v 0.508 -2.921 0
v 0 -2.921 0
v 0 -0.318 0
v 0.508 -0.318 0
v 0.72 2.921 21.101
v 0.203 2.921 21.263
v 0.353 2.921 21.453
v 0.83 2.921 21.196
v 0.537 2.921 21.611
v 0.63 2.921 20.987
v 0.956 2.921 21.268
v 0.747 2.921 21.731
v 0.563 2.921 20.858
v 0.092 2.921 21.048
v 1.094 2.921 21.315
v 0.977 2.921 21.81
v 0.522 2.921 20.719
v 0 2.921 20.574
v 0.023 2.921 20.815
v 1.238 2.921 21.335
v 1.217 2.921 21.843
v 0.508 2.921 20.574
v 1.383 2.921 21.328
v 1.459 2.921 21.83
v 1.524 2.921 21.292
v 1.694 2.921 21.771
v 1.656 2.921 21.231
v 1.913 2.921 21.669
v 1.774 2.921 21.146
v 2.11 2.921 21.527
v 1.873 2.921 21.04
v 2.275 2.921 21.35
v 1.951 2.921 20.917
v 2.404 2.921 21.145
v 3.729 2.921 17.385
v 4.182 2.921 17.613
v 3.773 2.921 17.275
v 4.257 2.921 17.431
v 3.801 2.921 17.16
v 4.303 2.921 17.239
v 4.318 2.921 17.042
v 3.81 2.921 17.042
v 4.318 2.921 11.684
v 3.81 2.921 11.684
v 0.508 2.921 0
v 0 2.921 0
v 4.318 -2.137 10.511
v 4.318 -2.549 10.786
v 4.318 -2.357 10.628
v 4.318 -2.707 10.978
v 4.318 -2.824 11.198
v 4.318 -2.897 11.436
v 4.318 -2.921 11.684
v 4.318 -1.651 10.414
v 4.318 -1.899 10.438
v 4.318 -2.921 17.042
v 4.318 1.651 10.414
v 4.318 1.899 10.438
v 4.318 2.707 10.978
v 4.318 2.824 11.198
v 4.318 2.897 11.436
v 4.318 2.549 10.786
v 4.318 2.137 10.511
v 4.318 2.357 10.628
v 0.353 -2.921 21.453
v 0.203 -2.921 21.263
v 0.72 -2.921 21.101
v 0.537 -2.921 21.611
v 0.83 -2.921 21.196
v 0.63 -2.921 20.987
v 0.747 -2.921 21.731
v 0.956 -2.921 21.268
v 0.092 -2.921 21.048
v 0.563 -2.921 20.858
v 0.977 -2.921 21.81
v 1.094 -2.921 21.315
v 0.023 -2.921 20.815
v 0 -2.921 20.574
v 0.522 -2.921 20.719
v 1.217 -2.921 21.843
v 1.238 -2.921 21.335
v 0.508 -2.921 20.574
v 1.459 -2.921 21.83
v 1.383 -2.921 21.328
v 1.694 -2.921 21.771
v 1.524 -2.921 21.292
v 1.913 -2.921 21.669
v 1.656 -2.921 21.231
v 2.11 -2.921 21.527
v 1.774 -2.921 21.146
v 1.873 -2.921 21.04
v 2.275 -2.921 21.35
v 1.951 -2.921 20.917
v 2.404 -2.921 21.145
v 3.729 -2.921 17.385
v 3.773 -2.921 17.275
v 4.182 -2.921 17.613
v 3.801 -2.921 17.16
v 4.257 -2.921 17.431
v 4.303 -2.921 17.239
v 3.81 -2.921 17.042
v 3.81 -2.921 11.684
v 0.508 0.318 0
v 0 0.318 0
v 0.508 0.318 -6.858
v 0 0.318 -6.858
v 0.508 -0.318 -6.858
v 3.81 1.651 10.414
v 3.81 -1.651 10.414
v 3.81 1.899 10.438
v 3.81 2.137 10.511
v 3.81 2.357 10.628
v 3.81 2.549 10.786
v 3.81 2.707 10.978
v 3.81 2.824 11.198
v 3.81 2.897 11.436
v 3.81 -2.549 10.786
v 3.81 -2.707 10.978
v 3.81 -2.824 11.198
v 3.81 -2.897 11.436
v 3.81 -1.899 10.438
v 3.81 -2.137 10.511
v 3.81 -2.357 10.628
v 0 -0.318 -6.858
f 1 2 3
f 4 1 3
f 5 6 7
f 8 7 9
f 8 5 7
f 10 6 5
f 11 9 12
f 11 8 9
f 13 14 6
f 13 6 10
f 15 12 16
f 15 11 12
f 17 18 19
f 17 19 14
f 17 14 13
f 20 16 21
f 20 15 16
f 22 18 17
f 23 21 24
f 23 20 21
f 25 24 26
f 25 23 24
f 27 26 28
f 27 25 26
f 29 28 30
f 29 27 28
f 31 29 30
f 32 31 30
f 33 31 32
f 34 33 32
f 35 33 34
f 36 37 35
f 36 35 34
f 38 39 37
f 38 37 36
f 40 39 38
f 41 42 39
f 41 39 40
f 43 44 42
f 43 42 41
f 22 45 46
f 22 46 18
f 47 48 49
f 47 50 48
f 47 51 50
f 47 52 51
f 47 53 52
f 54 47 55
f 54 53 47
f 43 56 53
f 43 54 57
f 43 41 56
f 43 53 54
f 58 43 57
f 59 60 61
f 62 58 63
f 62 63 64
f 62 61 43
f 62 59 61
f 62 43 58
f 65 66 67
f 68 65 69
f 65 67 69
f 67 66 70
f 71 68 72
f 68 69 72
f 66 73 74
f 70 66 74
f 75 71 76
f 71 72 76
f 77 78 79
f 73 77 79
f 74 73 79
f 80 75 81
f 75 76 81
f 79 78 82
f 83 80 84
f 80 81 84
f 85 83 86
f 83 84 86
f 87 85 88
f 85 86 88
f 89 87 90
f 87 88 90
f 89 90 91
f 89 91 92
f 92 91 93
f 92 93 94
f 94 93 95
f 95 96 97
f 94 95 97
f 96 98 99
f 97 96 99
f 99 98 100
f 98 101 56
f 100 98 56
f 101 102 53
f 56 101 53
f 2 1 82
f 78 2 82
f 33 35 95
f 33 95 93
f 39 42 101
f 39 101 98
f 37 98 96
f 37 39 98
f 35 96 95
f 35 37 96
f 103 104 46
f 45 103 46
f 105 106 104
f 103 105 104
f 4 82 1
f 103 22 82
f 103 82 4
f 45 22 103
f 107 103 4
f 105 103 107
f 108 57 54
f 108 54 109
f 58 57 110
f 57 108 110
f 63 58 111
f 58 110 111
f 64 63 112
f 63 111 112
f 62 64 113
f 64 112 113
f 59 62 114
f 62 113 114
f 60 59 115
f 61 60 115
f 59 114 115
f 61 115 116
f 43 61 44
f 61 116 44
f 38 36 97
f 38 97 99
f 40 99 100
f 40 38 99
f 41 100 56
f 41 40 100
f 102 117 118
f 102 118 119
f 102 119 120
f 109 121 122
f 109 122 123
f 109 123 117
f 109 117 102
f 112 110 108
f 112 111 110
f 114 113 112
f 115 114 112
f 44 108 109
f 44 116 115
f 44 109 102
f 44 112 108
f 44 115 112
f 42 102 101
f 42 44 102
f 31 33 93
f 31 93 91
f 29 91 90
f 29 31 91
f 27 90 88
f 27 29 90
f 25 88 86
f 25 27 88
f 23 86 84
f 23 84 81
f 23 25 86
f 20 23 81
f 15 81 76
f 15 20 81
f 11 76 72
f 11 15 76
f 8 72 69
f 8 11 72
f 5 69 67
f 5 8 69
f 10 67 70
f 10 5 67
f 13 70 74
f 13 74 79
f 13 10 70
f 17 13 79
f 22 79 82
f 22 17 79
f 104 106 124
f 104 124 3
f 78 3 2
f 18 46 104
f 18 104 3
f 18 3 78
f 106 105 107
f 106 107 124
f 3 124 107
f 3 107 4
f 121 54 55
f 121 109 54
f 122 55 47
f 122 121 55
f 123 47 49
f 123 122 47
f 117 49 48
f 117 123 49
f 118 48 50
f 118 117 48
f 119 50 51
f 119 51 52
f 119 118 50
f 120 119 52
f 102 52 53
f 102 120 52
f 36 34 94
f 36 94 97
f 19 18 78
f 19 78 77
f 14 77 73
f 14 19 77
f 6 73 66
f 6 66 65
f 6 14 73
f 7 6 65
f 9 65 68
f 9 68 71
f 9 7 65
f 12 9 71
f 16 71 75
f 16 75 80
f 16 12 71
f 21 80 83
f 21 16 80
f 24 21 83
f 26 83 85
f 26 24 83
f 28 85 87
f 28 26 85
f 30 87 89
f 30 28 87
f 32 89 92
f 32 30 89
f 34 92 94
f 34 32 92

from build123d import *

# Parameters (mm, degrees)
EXTRUDE_THIN1_DEPTH = 2.921
FILLET1_R           = 1.27
SKETCH2_W           = 6.858
SKETCH2_H           = 2.6035
CUT_EXTRUDE1_DEPTH  = 23.45746426


with BuildPart() as part:
    # Sketch1 → Extrude-Thin1 (new, symmetric)
    with BuildSketch(Plane(origin=(0, 0, 0), x_dir=(1, 0, 0), z_dir=(0, 1, 0))):
        with BuildLine():
            Line((0, 6.858), (0, 0))
            Line((0, 0), (0, -20.574))
            ThreePointArc((0, -20.574), (0.976529529, -21.809627404), (2.404370209, -21.145055365))
            Line((2.404370209, -21.145055365), (4.182370209, -17.613155736))
            ThreePointArc((4.182370209, -17.613155736), (4.283627404, -17.335570842), (4.318, -17.042100371))
            Line((4.318, -17.042100371), (4.318, -10.414))
            Line((4.318, -10.414), (3.81, -10.414))
            Line((3.81, -10.414), (3.81, -17.042100371))
            ThreePointArc((3.81, -17.042100371), (3.789376443, -17.218182654), (3.728622125, -17.38473359))
            Line((3.728622125, -17.38473359), (1.950622125, -20.916633219))
            ThreePointArc((1.950622125, -20.916633219), (1.093917717, -21.315376443), (0.508, -20.574))
            Line((0.508, -20.574), (0.508, 0))
            Line((0.508, 0), (0.508, 6.858))
            Line((0.508, 6.858), (0, 6.858))
        make_face()
    extrude(amount=EXTRUDE_THIN1_DEPTH, both=True)

    # Fillet1
    fillet1_edges = [part.edges().sort_by_distance(p)[0] for p in [
        (4.064, -2.921, 10.414),
        (4.064, 2.921, 10.414),
    ]]
    fillet(fillet1_edges, radius=FILLET1_R)

    # Sketch2 → Cut-Extrude1 (cut, through all)
    with BuildSketch(Plane.ZY):
        with Locations((-3.429, 1.61925)):
            Rectangle(SKETCH2_W, SKETCH2_H)
        with Locations((-3.429, -1.61925)):
            Rectangle(SKETCH2_W, SKETCH2_H)
    extrude(amount=-CUT_EXTRUDE1_DEPTH, mode=Mode.SUBTRACT)


solid = part.part
